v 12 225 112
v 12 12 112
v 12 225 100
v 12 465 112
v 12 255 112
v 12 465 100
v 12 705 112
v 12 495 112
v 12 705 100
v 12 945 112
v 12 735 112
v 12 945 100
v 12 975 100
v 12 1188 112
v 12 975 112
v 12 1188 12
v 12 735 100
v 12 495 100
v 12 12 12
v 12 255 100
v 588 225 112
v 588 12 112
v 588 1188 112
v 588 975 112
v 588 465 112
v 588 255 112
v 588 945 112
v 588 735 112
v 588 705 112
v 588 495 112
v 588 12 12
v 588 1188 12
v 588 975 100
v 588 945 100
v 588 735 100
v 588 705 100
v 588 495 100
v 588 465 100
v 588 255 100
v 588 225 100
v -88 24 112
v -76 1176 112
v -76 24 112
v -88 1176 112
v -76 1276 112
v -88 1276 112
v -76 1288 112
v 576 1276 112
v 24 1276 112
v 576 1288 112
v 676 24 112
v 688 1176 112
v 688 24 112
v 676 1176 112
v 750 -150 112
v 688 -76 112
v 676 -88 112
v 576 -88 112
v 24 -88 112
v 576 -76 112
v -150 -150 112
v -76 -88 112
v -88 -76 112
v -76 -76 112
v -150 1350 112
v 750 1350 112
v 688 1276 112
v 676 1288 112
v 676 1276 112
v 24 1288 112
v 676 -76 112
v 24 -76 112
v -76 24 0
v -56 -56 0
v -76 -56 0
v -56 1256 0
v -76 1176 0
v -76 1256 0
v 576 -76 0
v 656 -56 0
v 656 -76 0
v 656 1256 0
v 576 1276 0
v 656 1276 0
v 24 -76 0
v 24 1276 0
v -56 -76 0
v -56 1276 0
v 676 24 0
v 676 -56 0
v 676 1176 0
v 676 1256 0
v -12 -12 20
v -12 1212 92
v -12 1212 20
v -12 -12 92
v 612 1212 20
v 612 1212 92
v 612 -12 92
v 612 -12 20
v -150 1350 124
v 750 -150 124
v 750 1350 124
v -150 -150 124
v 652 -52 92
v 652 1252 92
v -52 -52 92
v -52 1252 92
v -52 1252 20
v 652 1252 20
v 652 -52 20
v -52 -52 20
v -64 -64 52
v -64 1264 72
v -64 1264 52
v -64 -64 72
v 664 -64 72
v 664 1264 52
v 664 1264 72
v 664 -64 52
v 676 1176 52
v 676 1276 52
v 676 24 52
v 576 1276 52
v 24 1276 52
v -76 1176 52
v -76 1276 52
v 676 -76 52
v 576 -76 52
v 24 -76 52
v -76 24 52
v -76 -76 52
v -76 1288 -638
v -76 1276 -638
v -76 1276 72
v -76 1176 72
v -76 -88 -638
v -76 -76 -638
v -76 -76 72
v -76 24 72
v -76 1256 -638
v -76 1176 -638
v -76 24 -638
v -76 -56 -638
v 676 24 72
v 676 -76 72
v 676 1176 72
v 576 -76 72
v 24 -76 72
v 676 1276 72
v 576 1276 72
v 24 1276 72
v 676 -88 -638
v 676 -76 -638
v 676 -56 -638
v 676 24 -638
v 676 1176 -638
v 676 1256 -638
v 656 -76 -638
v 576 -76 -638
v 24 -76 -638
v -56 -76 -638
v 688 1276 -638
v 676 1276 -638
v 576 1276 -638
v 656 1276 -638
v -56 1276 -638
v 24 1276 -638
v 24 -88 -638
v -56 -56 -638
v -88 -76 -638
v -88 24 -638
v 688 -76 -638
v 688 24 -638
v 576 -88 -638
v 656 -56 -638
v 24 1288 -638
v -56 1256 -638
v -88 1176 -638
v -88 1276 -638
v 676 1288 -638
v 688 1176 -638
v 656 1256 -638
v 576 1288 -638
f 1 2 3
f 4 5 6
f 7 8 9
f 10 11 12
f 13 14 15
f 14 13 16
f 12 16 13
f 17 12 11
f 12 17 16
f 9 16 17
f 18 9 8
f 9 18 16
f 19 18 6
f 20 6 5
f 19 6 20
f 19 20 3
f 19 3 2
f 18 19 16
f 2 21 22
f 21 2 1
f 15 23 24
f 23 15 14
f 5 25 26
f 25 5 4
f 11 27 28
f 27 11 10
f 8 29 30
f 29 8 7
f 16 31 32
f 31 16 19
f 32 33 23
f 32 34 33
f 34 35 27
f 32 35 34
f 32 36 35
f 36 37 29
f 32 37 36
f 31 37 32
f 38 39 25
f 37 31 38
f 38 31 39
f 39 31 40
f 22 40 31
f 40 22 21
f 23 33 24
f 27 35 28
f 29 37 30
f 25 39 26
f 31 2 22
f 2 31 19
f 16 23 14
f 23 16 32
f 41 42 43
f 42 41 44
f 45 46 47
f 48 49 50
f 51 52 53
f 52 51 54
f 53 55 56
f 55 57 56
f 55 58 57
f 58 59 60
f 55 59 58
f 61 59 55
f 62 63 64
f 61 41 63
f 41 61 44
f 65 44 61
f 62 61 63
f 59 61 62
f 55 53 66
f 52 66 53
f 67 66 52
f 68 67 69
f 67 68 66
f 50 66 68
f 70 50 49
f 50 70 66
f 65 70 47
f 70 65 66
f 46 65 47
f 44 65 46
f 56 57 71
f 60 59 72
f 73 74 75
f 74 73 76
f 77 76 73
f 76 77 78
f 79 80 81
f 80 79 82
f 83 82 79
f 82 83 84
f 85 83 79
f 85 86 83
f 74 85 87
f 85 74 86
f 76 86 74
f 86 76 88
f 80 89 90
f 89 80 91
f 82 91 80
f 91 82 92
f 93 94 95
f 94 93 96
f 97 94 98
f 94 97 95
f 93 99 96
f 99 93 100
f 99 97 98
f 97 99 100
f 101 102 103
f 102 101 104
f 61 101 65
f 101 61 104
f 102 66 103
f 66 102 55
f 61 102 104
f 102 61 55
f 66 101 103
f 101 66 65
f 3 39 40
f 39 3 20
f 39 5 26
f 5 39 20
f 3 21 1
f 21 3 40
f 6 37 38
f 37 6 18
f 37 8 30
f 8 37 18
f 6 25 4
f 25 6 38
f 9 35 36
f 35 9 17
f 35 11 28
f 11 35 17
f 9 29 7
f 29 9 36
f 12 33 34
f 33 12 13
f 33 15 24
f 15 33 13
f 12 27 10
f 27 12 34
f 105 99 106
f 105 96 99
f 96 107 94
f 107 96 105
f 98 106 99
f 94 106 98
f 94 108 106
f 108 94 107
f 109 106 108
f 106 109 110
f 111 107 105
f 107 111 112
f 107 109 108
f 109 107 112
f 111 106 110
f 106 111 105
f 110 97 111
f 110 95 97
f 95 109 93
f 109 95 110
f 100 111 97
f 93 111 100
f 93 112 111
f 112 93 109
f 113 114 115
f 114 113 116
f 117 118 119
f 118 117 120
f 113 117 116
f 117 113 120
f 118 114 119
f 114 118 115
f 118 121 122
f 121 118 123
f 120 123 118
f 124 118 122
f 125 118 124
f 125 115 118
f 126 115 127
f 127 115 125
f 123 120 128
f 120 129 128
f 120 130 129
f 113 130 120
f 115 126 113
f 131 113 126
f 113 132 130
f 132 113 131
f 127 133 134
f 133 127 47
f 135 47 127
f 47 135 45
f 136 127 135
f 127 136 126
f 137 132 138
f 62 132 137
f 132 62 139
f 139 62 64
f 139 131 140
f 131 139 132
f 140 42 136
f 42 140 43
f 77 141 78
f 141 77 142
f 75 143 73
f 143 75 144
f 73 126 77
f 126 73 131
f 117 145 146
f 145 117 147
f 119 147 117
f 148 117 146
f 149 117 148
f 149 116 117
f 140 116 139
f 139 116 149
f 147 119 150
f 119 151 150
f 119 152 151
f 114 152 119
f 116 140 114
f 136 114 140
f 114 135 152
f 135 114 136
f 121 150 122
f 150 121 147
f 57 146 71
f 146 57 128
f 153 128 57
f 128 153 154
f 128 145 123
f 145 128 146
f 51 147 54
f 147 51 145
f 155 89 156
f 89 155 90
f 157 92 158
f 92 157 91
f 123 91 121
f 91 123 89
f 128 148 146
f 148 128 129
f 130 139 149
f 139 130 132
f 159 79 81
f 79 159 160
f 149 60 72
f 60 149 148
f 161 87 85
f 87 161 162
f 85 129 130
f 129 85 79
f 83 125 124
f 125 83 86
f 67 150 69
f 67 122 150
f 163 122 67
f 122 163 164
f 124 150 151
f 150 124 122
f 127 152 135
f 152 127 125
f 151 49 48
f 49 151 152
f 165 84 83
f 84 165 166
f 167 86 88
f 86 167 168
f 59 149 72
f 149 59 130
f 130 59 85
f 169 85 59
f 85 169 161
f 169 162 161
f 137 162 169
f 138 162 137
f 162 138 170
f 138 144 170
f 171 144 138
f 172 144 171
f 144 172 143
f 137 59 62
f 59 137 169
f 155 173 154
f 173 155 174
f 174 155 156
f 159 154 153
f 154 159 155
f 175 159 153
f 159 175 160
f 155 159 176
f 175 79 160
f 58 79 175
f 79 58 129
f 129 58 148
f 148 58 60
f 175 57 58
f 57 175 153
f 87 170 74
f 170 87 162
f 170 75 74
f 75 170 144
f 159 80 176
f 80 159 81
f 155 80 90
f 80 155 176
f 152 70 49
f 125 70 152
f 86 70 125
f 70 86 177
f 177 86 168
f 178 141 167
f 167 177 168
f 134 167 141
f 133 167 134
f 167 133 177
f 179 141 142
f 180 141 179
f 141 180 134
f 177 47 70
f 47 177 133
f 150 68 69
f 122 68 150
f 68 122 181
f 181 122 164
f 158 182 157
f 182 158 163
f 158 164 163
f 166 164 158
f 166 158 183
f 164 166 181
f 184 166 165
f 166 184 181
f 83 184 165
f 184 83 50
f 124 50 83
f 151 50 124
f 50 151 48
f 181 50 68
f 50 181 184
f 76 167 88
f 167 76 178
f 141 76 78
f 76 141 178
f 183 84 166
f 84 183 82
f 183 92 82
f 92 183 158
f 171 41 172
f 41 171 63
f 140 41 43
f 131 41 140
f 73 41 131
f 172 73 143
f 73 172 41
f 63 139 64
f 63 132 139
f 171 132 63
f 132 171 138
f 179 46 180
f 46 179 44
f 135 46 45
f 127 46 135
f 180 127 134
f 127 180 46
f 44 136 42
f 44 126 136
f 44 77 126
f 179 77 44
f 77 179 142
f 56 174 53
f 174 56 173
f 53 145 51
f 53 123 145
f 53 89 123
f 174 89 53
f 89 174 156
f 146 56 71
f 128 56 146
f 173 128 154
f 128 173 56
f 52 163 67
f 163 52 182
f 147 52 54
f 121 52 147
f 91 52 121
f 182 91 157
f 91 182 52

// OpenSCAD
/////////////////////////////////////
// PROYECTO MESA JUEGOS
// MESA CON FOSO E ILUMINACION
// TAPAS SUPERIORES DESMONTABLES
// ACCESORIOS DE ENCASTRE EN RANURA LATERAL
// PARAMETRIZADA EN ALTURA ANCHURA Y LARGO
// DISEÑO PARA TABLERO DE 12MM GROSOR
// DISEÑADO PARA CORTES RECTOS
// DISEÑO PARA ENSAMBLE A TORNILLADO OCULTO
// JOSUE GONZALEZ 24/7/2017
////////////////////////////////////



//--parametros de la MESA
altura=750;
ancho=900;
largo=1500;
fondo_foso=100; // minimo 6cm
ala=150; // ala para apoyo brazos minimo 10
espesor_tablero=12;
//--parametros de diseño
// foso= ancho/largo - ala
ancho_foso=ancho-ala-ala;
largo_foso=largo-ala-ala;
es=espesor_tablero;



// foso

//--base foso
translate([0,0,0])
cube([ancho_foso,largo_foso,es]);

//--laterales foso interior led
union(){
translate([0,0,es])
color( "blue", 0.4 )
cube([es,largo_foso,fondo_foso]);
translate([ancho_foso-es,0,es])
color( "blue", 0.4 )
cube([es,largo_foso,fondo_foso]);
translate([es,0,es])
color( "red", 0.4 )
cube([ancho_foso-es-es,es,fondo_foso]);
translate([es,largo_foso-es,es])
color( "red", 0.4 )
cube([ancho_foso-es-es,es,fondo_foso]);
}
//--barra led 1cm de alto
//--ojo a modo de ilustracion
union(){
translate([0,0,12+fondo_foso-50])
color( "white", 1.0 )
cube([12,largo_foso,10]);
translate([ancho_foso-12,0,12+fondo_foso-50])
color( "white", 1.0 )
cube([12,largo_foso,10]);
translate([12,0,12+fondo_foso-50])
color( "white", 1.0 )
cube([ancho_foso-24,12,10]);
translate([12,largo_foso-12,12+fondo_foso-50])
color( "white", 1.0 )
cube([ancho_foso-24,12,10]);
}
//--laterales foso exterior
union(){
translate([-es,-es,0])
color( "orange", 0.4 )
cube([es,largo_foso+es+es,fondo_foso+es]);
translate([ancho_foso,-es,0])
color( "orange", 0.4 )
cube([es,largo_foso+es+es,fondo_foso+es]);
translate([0,-es,0])
color( "green", 0.4 )
cube([ancho_foso,es,fondo_foso+es]);
translate([0,largo_foso,0])
color( "green", 0.4 )
cube([ancho_foso,es,fondo_foso+es]);
}

// alas

// alas
union() {
translate([-ala,0,fondo_foso+es])
color( "red", 0.4 )
cube([ala,largo_foso,es]);
translate([ancho_foso,0,fondo_foso+es])
color( "red", 0.4 )
cube([ala,largo_foso,es]);

translate([-ala,-ala,fondo_foso+es])
color( "blue", 0.4 )
cube([ancho,ala,es]);
translate([-ala,largo-ala-ala,fondo_foso+es])
color( "blue", 0.4 )
cube([ancho,ala,es]);
}

// tapas

//--tapas
union(){
translate([0,0,fondo_foso+es])
color( "purple", 0.4 )
cube([ancho_foso,largo_foso/5,es]);

translate([0,largo_foso/5,fondo_foso+es])
color( "purple", 0.4 )
cube([ancho_foso,largo_foso/5,es]);
translate([es,largo_foso/5-15,fondo_foso])
color( "purple", 0.4 )
cube([ancho_foso-es-es,30,es]);



translate([0,(largo_foso/5)*2,fondo_foso+es])
color( "purple", 0.4 )
cube([ancho_foso,largo_foso/5,es]);
translate([es,(largo_foso/5)*2-15,fondo_foso])
color( "purple", 0.4 )
cube([ancho_foso-es-es,30,es]);    

translate([0,(largo_foso/5)*3,fondo_foso+es])
color( "purple", 0.4 )
cube([ancho_foso,largo_foso/5,es]);
translate([es,(largo_foso/5)*3-15,fondo_foso])
color( "purple", 0.4 )
cube([ancho_foso-es-es,30,es]); 

translate([0,(largo_foso/5)*4,fondo_foso+es])
color( "purple", 0.4 )
cube([ancho_foso,largo_foso/5,es]);
translate([es,(largo_foso/5)*4-15,fondo_foso])
color( "purple", 0.4 )
cube([ancho_foso-es-es,30,es]);
}



//--faldon

// refuerzos superiores
union(){
translate([-20-es,-20-es-20,fondo_foso-8])
color( "blue", 0.4 )
cube([20,largo_foso+es+es+20+20+20+20,20]);

translate([ancho_foso+es,-es-20-20,fondo_foso-8])
color( "blue", 0.4 )
cube([20,largo_foso+es+es+20+20+20+20,20]);

translate([-20-es-20,-20-es-20,fondo_foso-8])
color( "blue", 0.4 )
cube([20,largo_foso+es+es+20+20+20+20,20]);

translate([ancho_foso+es+20,-es-20-20,fondo_foso-8])
color( "blue", 0.4 )
cube([20,largo_foso+es+es+20+20+20+20,20]);


translate([0-es,-20-es,fondo_foso-8])
color( "red", 0.4 )
cube([ancho_foso+es+es,20,20]);

translate([-es,largo-ala-ala+es,fondo_foso-8])
color( "red", 0.4 )
cube([ancho_foso+es+es,20,20]);

translate([0-es,-20-es-20,fondo_foso-8])
color( "red", 0.4 )
cube([ancho_foso+es+es,20,20]);

translate([-es,largo-ala-ala+es+20,fondo_foso-8])
color( "red", 0.4 )
cube([ancho_foso+es+es,20,20]);
}

// refuerzos inferiores
union(){
translate([-20-es,-20-es-20,0])
color( "blue", 0.4 )
cube([20,largo_foso+es+es+20+20+20+20,20]);

translate([ancho_foso+es,-es-20-20,0])
color( "blue", 0.4 )
cube([20,largo_foso+es+es+20+20+20+20,20]);

translate([-20-es-20,-20-es-20,0])
color( "blue", 0.4 )
cube([20,largo_foso+es+es+20+20+20+20,20]);

translate([ancho_foso+es+20,-es-20-20,0])
color( "blue", 0.4 )
cube([20,largo_foso+es+es+20+20+20+20,20]);


translate([0-es,-20-es,0])
color( "red", 0.4 )
cube([ancho_foso+es+es,20,20]);

translate([-es,largo-ala-ala+es,0])
color( "red", 0.4 )
cube([ancho_foso+es+es,20,20]);

translate([0-es,-20-es-20,0])
color( "red", 0.4 )
cube([ancho_foso+es+es,20,20]);

translate([-es,largo-ala-ala+es+20,0])
color( "red", 0.4 )
cube([ancho_foso+es+es,20,20]);
}

//faldones interiores
union(){
translate([-es-40-es,-es-40,0])
color( "white", 0.4 )
cube([es,largo_foso+es+es+80,fondo_foso+12]);

translate([ancho_foso+40+es,-es-40,0])
color( "white", 0.4 )
cube([es,largo_foso+es+es+80,fondo_foso+es]);

translate([-50-es-2,-es-40-es,0])
color( "white", 0.4 )
cube([ancho_foso+100+es+es+4,es,fondo_foso+es]);

translate([-50-es-2,largo_foso+40+es,0])
color( "pink", 0.4 )
cube([ancho_foso+100+es+es+4,es,fondo_foso+es]);
}

//faldones exterior rail acesorios
union(){
translate([-es-40-es-es,-es-40-es,0])
color( "orange", 0.4 )
cube([12,largo_foso+es+es+80+es+es,fondo_foso+es-60]);
translate([-es-40-es-es,-es-40-es,fondo_foso+es-(fondo_foso+es-(fondo_foso+es-60)-20)])
color( "orange", 0.4 )
cube([es,largo_foso+es+es+80+es+es,fondo_foso+es-(fondo_foso+es-60)-20]);


translate([ancho_foso+40+es+es,-es-40-es,0])
color( "orange", 0.4 )
cube([es,largo_foso+es+es+80+es+es,fondo_foso+es-60]);
translate([ancho_foso+40+es+es,-es-40-es,fondo_foso+es-(fondo_foso+es-(fondo_foso+es-60)-20)])
color( "orange", 0.4 )
cube([es,largo_foso+es+es+80+es+es,fondo_foso+es-(fondo_foso+es-60)-20]);


translate([-50-es-es-2,-es-40-es-es,0])
color( "green", 0.4 )
cube([ancho_foso+100+es+es+es+es+4,es,fondo_foso+es-60]);
translate([-50-es-es-2,-es-40-es-es,fondo_foso+es-(fondo_foso+es-(fondo_foso+es-60)-20)])
color( "green", 0.4 )
cube([ancho_foso+100+es+es+es+es+4,es,fondo_foso+es-(fondo_foso+es-60)-20]);

translate([-50-es-es-2,largo_foso+40+es+es,0])
color( "green", 0.4 )
cube([ancho_foso+100+es+es+es+es+4,es,fondo_foso+es-60]);
translate([-50-es-es-2,largo_foso+40+es+es,fondo_foso+es-(fondo_foso+es-(fondo_foso+es-60)-20)])
color( "green", 0.4 )
cube([ancho_foso+100+es+es+es+es+4,es,fondo_foso+es-(fondo_foso+es-60)-20]);
}

//patas
union(){
translate([-es-20-20-es-es,-es-20-20-es-es-es,-altura+fondo_foso+es])
color( "grey", 0.4 )
cube([100,es,altura]);
translate([-es-es+ancho_foso,-es-20-20-es-es-es,-altura+fondo_foso+es])
color( "grey", 0.4 )
cube([100,es,altura]);
translate([-es-20-20-es-es,-es-20-20-es-es,-altura+fondo_foso+es])
color( "BLUE", 0.4 )
cube([20,20,altura-fondo_foso-es]);
translate([+20+20+es+4+ancho_foso,-es-20-20-es-es,-altura+fondo_foso+es])
color( "grey", 0.4 )
cube([20,20,altura-fondo_foso-es]);
    

translate([-12-20-20-es-es,20+20+es+es+es+largo_foso,-altura+fondo_foso+es])
color( "grey", 0.4 )
cube([100,es,altura]);
translate([-es-es+ancho_foso,20+20+es+es+es+largo_foso,-altura+fondo_foso+es])
color( "grey", 0.4 )
cube([100,es,altura]); 
 translate([-es-20-20-es-es,-es-es+4+20+20+es+es+es+largo_foso,-altura+fondo_foso+es])
color( "grey", 0.4 )
cube([20,20,altura-fondo_foso-es]); 
translate([+es+20+20+ancho_foso+4,20+20+es+largo_foso+4,-altura+fondo_foso+es])
color( "grey", 0.4 )
cube([20,20,altura-fondo_foso-es]);


translate([-es-20-20-es-es-es,-es-20-20-es-es,-altura+fondo_foso+es])
color( "RED", 0.4 )
cube([es,100,altura]);
translate([-es-20-20-es-es-es,-es-es+largo_foso,-altura+fondo_foso+es])
color( "grey", 0.4 )
cube([es,100,altura]);



translate([20+20+es+es+es+ancho_foso,-es-20-20-es-es,-altura+fondo_foso+es])
color( "grey", 0.4 )
cube([es,100,altura]);
translate([20+20+es+es+es+ancho_foso,-es-es+largo_foso,-altura+fondo_foso+es])
color( "grey", 0.4 )
cube([es,100,altura]);



}
//perforaciones

//perforaciones cables led a foso
*union(){
translate([3+es,50,3+fondo_foso-30])
color( "black" )
rotate([90,0,0])
cylinder(r=6/2,h=300,$fn=100);
translate([60,-es-es-es-es,20])
color("white")
rotate([90,90,0])
import ("arduino.stl");
translate([-20-es,-es-20,3-30])
color( "black" )
rotate([0,0,0])
cylinder(r=15/2,h=70,$fn=100);
}
